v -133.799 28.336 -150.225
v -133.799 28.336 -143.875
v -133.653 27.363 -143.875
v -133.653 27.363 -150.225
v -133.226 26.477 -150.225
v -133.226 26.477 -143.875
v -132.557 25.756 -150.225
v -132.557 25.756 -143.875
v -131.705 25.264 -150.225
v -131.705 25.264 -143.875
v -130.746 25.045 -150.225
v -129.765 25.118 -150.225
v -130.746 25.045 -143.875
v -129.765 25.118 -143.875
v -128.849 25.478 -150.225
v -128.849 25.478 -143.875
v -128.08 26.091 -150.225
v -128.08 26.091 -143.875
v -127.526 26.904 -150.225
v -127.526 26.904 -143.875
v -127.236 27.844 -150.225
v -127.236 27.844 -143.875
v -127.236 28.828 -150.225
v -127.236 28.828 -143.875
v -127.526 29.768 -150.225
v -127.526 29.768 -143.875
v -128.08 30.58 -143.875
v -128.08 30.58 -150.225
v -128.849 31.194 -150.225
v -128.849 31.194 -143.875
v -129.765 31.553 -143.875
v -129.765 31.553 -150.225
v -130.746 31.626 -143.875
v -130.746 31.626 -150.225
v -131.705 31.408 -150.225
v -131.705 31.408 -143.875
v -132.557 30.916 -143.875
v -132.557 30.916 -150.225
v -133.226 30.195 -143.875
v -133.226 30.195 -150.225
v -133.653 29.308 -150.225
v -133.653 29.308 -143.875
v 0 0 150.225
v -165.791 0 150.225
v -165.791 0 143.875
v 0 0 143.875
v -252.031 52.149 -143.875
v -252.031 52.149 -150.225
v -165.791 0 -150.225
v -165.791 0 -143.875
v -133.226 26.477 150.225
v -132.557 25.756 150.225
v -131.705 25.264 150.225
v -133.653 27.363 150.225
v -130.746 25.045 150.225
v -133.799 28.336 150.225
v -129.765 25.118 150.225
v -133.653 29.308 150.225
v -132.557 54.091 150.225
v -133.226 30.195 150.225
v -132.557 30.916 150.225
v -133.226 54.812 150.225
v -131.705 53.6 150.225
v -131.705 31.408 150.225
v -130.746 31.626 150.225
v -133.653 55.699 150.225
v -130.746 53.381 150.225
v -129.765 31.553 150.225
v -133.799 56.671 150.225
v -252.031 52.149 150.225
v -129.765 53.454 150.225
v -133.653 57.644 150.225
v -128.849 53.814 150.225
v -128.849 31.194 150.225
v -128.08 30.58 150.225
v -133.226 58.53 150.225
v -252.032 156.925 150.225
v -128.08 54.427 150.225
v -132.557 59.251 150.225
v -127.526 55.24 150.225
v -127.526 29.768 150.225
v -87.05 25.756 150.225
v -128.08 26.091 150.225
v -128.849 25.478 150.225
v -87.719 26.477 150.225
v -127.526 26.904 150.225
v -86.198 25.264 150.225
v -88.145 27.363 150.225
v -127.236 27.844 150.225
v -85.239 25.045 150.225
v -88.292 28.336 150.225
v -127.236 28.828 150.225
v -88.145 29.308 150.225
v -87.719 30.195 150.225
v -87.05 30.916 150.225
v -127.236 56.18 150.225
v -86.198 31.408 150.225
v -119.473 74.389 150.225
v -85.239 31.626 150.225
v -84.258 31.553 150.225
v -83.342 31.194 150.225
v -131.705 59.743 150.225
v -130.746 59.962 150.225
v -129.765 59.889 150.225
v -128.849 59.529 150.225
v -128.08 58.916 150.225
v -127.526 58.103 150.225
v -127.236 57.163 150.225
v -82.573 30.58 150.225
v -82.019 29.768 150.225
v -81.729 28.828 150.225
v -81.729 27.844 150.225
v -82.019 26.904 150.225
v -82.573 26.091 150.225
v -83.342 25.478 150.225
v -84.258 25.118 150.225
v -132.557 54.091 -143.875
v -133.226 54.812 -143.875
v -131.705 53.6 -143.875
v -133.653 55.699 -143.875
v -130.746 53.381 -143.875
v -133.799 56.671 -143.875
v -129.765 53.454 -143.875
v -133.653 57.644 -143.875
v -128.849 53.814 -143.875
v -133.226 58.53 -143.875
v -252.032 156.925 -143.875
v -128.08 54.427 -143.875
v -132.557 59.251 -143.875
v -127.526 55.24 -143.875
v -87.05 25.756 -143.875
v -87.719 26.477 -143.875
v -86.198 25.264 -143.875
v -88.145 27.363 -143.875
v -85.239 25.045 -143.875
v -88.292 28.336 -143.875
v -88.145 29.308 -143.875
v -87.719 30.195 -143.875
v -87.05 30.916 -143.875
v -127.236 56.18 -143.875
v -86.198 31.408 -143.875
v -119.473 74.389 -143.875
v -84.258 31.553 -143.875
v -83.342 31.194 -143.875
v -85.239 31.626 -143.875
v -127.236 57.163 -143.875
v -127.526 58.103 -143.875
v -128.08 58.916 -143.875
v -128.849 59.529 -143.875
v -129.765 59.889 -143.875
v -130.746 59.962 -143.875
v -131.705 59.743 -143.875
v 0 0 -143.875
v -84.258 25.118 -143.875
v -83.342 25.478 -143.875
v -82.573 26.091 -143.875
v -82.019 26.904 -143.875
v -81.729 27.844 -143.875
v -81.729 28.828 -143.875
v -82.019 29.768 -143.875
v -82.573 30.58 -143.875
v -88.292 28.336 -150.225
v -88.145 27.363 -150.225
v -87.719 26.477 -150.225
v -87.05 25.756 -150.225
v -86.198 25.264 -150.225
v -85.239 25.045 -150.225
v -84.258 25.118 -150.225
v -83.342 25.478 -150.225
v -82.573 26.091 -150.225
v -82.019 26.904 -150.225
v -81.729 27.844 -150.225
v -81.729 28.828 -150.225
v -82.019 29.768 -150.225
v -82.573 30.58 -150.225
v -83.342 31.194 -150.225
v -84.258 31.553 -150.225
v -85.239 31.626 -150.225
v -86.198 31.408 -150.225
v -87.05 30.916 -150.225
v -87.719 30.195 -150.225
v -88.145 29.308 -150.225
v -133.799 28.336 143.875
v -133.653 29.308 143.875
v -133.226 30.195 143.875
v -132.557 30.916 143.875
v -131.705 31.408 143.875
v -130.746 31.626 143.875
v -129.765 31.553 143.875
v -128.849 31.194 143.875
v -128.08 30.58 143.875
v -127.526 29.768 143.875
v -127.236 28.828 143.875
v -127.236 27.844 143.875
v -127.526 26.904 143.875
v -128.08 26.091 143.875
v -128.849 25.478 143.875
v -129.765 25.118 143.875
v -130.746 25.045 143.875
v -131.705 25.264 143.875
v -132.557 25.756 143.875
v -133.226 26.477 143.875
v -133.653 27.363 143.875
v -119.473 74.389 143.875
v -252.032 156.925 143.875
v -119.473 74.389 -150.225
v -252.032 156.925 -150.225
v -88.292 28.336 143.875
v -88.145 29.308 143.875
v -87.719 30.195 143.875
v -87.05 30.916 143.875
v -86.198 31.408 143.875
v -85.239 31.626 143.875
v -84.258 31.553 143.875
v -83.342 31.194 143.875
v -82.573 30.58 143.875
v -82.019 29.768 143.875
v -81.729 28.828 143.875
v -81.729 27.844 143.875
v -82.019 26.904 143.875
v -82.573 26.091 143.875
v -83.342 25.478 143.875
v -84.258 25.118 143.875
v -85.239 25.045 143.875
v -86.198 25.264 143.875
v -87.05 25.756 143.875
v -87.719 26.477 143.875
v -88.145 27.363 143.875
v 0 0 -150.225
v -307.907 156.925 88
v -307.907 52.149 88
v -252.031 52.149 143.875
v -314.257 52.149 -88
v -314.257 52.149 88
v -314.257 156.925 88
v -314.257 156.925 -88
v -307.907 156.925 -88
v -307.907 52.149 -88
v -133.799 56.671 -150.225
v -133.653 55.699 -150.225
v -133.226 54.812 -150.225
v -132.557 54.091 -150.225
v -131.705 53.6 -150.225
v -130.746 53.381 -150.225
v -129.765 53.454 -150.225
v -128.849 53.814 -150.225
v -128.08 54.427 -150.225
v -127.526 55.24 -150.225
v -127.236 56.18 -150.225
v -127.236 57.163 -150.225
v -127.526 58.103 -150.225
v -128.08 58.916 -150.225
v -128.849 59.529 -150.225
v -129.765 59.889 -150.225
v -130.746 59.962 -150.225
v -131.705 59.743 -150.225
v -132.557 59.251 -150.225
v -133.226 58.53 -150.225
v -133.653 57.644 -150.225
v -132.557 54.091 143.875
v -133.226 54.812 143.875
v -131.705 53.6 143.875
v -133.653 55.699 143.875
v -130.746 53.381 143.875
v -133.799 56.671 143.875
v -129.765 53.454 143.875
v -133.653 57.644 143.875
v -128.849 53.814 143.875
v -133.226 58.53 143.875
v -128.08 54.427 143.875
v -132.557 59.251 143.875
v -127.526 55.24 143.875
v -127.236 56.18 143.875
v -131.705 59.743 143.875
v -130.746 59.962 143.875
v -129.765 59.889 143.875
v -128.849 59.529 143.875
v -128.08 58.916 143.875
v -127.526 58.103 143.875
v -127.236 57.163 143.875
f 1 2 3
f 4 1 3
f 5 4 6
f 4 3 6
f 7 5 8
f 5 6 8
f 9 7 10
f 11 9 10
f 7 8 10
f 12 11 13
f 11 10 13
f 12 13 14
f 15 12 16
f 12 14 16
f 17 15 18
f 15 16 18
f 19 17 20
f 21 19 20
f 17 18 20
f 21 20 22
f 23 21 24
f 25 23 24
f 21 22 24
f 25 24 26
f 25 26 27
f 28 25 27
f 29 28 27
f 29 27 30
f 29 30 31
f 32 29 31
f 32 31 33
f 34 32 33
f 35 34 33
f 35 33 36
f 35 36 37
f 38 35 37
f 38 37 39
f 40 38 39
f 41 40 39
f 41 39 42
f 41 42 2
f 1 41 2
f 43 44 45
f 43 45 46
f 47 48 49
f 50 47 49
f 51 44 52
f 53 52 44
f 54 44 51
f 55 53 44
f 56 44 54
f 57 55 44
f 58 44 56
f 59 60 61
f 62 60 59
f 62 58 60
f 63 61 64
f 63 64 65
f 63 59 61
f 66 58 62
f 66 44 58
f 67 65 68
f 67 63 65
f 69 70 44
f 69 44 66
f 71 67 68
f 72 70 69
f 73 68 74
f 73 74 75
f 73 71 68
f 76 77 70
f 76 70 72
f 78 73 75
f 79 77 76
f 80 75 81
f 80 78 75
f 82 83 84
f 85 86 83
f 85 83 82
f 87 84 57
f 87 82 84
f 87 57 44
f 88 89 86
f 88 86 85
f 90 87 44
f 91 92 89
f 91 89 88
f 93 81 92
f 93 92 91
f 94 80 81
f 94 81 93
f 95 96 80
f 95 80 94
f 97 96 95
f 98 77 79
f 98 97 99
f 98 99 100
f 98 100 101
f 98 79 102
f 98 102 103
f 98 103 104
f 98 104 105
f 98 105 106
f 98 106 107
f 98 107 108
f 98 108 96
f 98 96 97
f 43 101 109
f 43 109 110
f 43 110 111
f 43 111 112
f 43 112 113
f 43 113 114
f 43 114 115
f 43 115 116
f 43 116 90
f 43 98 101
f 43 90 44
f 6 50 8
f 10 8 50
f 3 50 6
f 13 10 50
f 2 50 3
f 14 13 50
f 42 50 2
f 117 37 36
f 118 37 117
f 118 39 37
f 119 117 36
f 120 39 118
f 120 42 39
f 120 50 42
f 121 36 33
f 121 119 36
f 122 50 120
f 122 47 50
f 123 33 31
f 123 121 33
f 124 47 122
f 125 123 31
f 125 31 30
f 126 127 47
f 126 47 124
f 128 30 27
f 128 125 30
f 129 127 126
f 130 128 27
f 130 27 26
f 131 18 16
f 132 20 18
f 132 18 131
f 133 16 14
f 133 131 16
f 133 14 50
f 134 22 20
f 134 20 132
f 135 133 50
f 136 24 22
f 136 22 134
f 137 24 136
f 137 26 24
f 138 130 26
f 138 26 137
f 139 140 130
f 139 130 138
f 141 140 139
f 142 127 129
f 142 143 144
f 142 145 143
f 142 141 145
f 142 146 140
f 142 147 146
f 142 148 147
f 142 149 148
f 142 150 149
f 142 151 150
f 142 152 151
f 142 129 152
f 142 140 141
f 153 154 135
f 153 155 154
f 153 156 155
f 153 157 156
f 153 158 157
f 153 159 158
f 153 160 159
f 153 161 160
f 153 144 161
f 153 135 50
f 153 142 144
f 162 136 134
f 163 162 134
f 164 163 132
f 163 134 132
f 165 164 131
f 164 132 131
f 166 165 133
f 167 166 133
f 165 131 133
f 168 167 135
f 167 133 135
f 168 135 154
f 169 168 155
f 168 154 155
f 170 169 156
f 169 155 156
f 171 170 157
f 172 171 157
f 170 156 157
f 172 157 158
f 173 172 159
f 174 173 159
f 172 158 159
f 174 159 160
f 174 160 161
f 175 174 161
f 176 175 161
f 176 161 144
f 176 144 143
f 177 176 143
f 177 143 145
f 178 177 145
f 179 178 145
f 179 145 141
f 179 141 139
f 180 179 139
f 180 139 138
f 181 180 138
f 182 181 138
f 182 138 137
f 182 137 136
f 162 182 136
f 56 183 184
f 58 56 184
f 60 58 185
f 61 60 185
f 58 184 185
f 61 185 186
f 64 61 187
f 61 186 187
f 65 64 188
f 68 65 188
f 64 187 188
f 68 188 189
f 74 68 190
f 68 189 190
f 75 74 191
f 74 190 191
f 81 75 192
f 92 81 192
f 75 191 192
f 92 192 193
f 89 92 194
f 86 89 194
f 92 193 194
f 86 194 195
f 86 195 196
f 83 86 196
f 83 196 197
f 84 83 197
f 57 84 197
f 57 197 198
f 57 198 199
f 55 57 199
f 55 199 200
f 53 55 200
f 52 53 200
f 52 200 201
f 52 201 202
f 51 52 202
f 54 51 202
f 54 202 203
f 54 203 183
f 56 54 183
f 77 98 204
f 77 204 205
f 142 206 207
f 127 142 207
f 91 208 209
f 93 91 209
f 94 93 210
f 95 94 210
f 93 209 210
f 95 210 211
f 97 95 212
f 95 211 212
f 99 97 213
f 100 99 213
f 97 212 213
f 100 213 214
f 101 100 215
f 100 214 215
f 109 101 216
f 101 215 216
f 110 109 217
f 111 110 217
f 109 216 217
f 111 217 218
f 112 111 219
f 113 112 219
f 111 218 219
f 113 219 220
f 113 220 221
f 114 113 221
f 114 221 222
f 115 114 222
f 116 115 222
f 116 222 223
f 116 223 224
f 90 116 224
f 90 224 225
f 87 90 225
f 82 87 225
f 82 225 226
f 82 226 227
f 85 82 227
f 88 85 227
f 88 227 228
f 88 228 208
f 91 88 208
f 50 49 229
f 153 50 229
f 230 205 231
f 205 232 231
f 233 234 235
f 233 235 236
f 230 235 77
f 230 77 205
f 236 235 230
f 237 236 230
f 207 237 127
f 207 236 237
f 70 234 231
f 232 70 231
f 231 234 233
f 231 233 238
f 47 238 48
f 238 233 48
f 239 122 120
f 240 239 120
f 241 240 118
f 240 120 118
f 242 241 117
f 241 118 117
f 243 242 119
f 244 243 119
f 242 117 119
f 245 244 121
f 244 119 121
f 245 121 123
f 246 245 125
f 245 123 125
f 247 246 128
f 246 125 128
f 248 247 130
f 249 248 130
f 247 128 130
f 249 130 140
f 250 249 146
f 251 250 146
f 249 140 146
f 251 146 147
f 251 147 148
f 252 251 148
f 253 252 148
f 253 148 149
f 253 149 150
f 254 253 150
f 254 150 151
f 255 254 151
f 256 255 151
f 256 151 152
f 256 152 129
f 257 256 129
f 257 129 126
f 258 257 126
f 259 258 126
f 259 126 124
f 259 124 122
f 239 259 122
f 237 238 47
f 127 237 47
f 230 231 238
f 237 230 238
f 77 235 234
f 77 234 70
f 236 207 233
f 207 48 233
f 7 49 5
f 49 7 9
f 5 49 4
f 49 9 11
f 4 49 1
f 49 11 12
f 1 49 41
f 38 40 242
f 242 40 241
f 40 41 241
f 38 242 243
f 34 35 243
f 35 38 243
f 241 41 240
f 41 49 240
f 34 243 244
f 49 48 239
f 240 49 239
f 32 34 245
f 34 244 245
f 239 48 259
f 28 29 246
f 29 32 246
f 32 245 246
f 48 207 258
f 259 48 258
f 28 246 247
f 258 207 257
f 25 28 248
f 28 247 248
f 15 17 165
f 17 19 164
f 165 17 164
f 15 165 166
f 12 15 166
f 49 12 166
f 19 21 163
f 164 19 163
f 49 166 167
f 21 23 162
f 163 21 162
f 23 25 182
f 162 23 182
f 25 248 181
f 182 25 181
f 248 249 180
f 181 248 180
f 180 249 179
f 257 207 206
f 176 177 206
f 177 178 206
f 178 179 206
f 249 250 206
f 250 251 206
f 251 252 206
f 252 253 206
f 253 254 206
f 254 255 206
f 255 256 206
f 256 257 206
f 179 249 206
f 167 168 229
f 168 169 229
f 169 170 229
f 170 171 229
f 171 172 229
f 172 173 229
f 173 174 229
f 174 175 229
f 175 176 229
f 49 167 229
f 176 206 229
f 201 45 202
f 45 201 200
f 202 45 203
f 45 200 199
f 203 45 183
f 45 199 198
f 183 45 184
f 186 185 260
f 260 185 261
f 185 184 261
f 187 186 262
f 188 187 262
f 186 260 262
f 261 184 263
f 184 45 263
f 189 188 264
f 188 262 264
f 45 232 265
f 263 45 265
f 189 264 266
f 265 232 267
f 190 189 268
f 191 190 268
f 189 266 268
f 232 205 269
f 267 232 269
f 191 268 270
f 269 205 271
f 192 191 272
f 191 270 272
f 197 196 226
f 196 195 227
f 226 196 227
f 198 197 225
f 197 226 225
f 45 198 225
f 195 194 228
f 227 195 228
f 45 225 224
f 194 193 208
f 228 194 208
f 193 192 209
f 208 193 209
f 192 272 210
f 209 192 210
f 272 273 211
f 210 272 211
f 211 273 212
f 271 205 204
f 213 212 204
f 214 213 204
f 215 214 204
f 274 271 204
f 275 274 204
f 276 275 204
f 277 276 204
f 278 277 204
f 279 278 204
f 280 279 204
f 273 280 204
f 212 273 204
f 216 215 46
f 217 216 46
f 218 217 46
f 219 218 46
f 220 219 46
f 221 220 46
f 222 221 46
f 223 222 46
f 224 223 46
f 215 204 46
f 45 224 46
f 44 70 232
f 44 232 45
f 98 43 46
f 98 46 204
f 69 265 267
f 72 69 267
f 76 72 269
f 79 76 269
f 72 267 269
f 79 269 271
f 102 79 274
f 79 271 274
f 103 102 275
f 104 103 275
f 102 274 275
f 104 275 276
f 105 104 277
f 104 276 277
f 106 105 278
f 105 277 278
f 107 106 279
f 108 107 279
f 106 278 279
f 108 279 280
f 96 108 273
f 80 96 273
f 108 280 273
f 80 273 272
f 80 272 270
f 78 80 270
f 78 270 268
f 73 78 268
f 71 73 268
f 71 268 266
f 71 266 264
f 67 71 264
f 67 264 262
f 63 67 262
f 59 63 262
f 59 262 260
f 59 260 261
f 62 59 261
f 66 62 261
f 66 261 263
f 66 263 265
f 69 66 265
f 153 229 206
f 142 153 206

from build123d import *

# Parameters (mm, degrees)
SKETCH5_W                = 6.35
SKETCH5_H                = 176
BOSS_EXTRUDE1_DEPTH      = 104.775666
BOSS_EXTRUDE2_DEPTH      = 6.35
BOSS_EXTRUDE3_DEPTH      = 6.35
M6_CLEARANCE_HOLE5_D     = 6.6
M6_CLEARANCE_HOLE5_DEPTH = 6.35
M6_CLEARANCE_HOLE4_D     = 6.6


with BuildPart() as part:
    # Sketch5 → Boss-Extrude1 (new body)
    with BuildSketch(Plane(origin=(0, 52.149159956, 0), x_dir=(1, 0, 0), z_dir=(0, 1, 0))):
        with Locations((-311.081896744, 0)):
            Rectangle(SKETCH5_W, SKETCH5_H)
        Polygon((-252.0315, -143.875396744), (-307.906896744, -88), (-314.256896744, -88), (-252.0315, -150.225396744), align=None)
        Polygon((-307.906896744, 88), (-252.0315, 143.875396744), (-252.0315, 150.225396744), (-314.256896744, 88), align=None)
    extrude(amount=BOSS_EXTRUDE1_DEPTH)

    # Sketch3 → Boss-Extrude2 (add)
    with BuildSketch(Plane.XY.offset(150.225396744)):
        Polygon((-130.499303898, 0), (-39.48466449, 0), (-84.991984194, 28.335711553), (-130.499303898, 28.335711553), align=None)
        Polygon((-39.48466449, 0), (0, 0), (-119.473415555, 74.388895455), (-165.790897492, 0), (-130.499303898, 0), (-130.499303898, 28.335711553), (-130.499303898, 56.671423106), (-84.991984194, 28.335711553), align=None)
        Polygon((-165.790897492, 0), (-119.473415555, 74.388895455), (-165.790897492, 103.228), align=None)
        Polygon((-130.499303898, 28.335711553), (-84.991984194, 28.335711553), (-130.499303898, 56.671423106), align=None)
        Polygon((-165.790897492, 0), (-165.790897492, 103.228), (-252.0315, 156.924825642), (-252.0315, 52.149159956), align=None)
    extrude(amount=-BOSS_EXTRUDE2_DEPTH)

    # Sketch8 → Boss-Extrude3 (add)
    with BuildSketch(Plane.XY.offset(-150.225396744)):
        Polygon((-165.790897492, 0), (-165.790897492, 103.228), (-252.0315, 156.924825642), (-252.0315, 52.149159956), align=None)
        Polygon((-165.790897492, 0), (-119.473415555, 74.388895455), (-165.790897492, 103.228), align=None)
        Polygon((-39.48466449, 0), (0, 0), (-119.473415555, 74.388895455), (-165.790897492, 0), (-130.499303898, 0), (-130.499303898, 28.335711553), (-130.499303898, 56.671423106), (-84.991984194, 28.335711553), align=None)
        Polygon((-130.499303898, 0), (-39.48466449, 0), (-84.991984194, 28.335711553), (-130.499303898, 28.335711553), align=None)
        Polygon((-130.499303898, 28.335711553), (-84.991984194, 28.335711553), (-130.499303898, 56.671423106), align=None)
    extrude(amount=BOSS_EXTRUDE3_DEPTH)

    # M6 Clearance Hole5
    with Locations(Plane(origin=(0, 0, -150.225396744), x_dir=(1, 0, 0), z_dir=(0, 0, -1))):
        with Locations((-84.991984194, -28.335711553), (-130.499303898, -28.335711553), (-130.499303898, -56.671423106)):
            Hole(M6_CLEARANCE_HOLE5_D / 2, depth=M6_CLEARANCE_HOLE5_DEPTH)

    # M6 Clearance Hole4 (through all)
    with Locations(Plane.XY.offset(150.225396744)):
        with Locations((-84.991984194, 28.335711553), (-130.499303898, 28.335711553), (-130.499303898, 56.671423106)):
            Hole(M6_CLEARANCE_HOLE4_D / 2)


solid = part.part
